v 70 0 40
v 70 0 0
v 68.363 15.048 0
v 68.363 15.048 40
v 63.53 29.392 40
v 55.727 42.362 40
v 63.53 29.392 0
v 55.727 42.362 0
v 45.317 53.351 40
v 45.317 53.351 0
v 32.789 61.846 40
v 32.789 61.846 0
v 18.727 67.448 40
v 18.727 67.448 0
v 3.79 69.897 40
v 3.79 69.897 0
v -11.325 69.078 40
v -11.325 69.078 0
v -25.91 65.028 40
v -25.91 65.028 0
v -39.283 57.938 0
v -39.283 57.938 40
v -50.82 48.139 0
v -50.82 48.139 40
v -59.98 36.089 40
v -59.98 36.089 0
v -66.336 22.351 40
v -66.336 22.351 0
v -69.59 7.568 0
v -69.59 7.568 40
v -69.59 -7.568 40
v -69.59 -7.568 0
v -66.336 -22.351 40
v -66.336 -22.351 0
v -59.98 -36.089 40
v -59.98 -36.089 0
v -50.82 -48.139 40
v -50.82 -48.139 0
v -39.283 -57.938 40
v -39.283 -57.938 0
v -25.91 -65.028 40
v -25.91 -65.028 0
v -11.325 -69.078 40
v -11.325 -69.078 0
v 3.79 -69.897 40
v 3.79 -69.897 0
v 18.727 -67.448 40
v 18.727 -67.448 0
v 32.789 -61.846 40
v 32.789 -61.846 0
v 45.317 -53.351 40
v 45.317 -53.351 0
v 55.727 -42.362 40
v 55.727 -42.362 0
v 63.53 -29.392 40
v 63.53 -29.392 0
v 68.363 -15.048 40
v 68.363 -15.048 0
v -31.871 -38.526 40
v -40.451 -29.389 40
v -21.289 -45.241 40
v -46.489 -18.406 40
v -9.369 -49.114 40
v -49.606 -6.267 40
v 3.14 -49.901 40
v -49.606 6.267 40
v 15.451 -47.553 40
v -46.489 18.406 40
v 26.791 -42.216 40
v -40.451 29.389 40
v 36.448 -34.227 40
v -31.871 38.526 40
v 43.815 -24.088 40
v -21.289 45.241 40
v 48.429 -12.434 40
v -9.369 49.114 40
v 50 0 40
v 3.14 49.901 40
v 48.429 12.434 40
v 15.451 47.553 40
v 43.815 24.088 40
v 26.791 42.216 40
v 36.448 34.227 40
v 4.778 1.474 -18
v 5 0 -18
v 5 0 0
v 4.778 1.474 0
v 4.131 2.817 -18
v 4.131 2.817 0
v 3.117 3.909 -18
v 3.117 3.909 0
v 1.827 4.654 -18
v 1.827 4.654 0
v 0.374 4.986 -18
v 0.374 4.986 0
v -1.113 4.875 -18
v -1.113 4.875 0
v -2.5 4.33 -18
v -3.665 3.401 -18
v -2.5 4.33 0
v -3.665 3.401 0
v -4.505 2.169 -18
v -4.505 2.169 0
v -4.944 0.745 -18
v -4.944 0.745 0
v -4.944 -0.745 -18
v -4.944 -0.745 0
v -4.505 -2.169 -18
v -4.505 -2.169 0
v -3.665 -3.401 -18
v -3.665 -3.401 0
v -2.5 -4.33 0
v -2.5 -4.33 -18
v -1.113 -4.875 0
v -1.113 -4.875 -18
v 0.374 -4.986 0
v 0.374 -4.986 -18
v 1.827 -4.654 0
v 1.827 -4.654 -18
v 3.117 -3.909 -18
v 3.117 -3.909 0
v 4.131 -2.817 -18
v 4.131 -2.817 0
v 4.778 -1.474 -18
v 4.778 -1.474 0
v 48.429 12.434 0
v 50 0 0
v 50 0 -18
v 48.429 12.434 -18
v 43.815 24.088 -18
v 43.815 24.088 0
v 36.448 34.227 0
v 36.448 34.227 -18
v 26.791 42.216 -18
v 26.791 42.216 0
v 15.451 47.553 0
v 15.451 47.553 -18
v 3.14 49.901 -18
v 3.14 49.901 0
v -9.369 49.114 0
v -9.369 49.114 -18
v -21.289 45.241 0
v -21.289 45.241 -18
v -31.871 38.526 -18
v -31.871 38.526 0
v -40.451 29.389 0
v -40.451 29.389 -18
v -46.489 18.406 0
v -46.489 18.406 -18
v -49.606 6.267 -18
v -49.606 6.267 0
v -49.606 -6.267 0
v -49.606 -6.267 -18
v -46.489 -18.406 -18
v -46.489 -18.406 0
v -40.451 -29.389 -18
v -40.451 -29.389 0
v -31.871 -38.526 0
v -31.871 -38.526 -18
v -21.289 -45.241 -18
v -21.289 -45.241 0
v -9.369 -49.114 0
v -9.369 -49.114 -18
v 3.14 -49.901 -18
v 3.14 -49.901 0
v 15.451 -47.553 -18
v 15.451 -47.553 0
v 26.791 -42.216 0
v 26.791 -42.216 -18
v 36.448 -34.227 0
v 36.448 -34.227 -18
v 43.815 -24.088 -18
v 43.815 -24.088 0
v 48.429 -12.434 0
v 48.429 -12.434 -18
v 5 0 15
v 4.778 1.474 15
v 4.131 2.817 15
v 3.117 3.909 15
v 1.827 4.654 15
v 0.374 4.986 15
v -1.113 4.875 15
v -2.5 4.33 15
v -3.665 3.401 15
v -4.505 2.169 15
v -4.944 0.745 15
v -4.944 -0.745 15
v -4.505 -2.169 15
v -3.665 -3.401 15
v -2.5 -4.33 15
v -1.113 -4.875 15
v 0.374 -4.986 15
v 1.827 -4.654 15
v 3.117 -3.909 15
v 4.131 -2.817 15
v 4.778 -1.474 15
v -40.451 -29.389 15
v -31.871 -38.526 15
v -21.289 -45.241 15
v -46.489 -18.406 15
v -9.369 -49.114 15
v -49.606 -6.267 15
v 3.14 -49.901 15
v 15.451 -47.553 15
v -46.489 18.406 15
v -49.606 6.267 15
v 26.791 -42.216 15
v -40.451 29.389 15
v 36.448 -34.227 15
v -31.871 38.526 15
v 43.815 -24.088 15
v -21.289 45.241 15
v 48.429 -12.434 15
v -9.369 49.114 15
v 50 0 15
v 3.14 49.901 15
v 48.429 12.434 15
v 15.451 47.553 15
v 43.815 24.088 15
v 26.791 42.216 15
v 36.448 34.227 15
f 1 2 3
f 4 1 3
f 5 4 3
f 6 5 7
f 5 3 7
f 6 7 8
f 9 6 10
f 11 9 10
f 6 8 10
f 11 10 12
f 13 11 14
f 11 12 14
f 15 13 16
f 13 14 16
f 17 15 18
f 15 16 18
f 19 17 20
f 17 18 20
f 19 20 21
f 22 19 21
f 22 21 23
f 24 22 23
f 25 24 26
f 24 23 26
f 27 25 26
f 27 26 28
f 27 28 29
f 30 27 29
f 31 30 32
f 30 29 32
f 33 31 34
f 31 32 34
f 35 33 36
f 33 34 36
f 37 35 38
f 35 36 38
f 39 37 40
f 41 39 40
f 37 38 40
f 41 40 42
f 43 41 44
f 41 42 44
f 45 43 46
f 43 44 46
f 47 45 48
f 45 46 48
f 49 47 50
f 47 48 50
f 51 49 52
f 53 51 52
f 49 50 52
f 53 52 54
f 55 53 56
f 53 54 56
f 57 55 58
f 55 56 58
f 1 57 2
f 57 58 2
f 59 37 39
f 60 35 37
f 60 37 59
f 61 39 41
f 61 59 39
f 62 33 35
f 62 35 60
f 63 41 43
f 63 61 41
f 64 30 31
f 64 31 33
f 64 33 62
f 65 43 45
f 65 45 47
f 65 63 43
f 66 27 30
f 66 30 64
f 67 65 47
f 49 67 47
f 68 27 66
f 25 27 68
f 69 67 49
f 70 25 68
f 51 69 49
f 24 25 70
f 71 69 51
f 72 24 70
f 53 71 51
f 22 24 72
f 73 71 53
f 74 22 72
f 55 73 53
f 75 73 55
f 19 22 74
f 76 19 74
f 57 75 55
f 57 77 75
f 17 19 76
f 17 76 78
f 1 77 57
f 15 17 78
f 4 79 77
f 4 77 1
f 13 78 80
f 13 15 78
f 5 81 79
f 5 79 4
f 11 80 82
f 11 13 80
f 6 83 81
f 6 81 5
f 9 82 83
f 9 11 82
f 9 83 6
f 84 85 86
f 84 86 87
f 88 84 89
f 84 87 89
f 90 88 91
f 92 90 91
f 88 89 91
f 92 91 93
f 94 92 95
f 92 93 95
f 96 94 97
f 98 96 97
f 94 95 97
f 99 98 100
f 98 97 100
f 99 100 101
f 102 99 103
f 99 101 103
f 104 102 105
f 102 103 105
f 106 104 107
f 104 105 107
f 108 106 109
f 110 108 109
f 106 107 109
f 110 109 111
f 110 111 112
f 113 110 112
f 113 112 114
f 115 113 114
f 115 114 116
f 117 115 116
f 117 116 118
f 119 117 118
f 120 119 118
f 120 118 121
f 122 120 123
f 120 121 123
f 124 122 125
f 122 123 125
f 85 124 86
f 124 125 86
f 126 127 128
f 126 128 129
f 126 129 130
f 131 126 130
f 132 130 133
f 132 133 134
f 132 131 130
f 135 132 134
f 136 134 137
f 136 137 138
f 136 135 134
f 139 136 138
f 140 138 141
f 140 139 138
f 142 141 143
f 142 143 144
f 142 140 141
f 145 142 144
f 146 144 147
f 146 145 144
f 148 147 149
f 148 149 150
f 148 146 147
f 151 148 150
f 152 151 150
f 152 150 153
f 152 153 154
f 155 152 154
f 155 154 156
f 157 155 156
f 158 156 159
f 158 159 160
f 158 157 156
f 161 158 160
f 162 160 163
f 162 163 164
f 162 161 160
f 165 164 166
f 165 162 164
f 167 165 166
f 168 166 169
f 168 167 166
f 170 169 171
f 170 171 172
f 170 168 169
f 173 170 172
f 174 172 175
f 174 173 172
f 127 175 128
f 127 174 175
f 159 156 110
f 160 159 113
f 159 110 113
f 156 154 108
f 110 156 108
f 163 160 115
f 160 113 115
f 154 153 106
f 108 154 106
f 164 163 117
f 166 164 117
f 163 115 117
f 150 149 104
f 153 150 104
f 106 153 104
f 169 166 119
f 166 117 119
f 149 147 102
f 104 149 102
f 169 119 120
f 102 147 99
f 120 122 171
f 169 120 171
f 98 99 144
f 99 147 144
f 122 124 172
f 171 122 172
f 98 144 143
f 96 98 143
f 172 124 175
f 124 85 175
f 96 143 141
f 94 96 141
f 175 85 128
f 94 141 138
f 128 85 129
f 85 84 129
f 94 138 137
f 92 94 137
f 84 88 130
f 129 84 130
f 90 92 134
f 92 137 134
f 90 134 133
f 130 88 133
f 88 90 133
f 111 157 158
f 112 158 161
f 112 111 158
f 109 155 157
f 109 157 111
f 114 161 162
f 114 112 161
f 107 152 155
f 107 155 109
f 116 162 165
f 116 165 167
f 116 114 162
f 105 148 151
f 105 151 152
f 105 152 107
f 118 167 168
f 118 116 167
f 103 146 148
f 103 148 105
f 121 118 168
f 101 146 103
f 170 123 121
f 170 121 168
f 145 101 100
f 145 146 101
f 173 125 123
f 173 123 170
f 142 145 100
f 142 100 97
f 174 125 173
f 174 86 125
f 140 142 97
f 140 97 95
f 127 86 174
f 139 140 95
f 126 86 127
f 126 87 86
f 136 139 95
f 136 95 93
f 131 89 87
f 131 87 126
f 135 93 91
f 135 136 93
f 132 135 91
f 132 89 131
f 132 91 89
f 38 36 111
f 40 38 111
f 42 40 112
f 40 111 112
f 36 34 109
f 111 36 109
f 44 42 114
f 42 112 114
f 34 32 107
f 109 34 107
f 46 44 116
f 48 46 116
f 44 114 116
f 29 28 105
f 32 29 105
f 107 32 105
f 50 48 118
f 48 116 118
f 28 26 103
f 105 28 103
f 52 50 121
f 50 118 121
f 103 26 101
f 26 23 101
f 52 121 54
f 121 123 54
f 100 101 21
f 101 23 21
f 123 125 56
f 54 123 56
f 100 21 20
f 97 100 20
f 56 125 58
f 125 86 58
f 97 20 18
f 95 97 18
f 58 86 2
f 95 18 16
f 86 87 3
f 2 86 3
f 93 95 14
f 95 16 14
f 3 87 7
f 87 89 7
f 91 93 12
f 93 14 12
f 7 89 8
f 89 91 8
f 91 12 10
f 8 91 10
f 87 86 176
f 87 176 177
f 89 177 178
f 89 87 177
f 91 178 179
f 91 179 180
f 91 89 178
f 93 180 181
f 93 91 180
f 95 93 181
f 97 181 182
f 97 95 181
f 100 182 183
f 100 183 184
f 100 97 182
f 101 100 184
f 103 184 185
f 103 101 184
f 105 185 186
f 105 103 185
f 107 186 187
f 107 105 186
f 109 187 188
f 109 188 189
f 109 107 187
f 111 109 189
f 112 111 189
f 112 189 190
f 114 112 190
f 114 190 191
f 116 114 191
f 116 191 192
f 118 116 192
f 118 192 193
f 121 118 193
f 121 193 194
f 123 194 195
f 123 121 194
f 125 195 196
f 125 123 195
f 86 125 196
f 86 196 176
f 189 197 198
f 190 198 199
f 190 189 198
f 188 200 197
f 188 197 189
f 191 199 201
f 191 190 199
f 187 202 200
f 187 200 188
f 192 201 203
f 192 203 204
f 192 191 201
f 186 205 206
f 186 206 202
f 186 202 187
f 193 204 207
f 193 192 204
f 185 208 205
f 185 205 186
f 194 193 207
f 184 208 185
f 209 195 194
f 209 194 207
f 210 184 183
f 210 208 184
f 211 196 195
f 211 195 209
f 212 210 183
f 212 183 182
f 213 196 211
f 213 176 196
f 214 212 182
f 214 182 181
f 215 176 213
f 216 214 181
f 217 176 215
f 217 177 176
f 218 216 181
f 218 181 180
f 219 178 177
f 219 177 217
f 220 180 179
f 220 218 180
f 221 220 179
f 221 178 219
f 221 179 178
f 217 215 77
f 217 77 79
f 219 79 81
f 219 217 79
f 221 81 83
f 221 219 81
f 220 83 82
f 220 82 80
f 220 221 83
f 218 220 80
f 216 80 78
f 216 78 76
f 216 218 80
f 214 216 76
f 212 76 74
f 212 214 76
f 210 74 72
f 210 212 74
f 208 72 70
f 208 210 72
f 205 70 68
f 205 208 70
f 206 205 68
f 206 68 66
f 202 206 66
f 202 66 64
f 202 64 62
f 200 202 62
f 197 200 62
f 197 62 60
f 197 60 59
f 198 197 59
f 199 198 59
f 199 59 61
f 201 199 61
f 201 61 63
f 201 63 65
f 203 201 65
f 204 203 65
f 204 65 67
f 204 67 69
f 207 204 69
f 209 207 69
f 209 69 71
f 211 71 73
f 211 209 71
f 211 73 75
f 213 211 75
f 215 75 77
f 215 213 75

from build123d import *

# Parameters (mm, degrees)
F0_R     = 70
F0_R_2   = 50
F1_DEPTH = 40
F0_R_3   = 5
F2_DEPTH = 15
F3_DEPTH = 18


with BuildPart() as f1:
    # F0 (on Top) → F1 (new body)
    with BuildSketch(Plane.XY):
        Circle(F0_R)
        Circle(F0_R_2, mode=Mode.SUBTRACT)
    extrude(amount=F1_DEPTH)

    # F0 (on Top) → F2 (join)
    with BuildSketch(Plane.XY):
        Circle(F0_R_2)
        Circle(F0_R_3, mode=Mode.SUBTRACT)
    extrude(amount=F2_DEPTH)


with BuildPart() as f3:
    # F0 (on Top) → F3 (new body)
    with BuildSketch(Plane.XY):
        Circle(F0_R_2)
        Circle(F0_R_3, mode=Mode.SUBTRACT)
    extrude(amount=-F3_DEPTH)


solid = Compound([f1.part, f3.part])
